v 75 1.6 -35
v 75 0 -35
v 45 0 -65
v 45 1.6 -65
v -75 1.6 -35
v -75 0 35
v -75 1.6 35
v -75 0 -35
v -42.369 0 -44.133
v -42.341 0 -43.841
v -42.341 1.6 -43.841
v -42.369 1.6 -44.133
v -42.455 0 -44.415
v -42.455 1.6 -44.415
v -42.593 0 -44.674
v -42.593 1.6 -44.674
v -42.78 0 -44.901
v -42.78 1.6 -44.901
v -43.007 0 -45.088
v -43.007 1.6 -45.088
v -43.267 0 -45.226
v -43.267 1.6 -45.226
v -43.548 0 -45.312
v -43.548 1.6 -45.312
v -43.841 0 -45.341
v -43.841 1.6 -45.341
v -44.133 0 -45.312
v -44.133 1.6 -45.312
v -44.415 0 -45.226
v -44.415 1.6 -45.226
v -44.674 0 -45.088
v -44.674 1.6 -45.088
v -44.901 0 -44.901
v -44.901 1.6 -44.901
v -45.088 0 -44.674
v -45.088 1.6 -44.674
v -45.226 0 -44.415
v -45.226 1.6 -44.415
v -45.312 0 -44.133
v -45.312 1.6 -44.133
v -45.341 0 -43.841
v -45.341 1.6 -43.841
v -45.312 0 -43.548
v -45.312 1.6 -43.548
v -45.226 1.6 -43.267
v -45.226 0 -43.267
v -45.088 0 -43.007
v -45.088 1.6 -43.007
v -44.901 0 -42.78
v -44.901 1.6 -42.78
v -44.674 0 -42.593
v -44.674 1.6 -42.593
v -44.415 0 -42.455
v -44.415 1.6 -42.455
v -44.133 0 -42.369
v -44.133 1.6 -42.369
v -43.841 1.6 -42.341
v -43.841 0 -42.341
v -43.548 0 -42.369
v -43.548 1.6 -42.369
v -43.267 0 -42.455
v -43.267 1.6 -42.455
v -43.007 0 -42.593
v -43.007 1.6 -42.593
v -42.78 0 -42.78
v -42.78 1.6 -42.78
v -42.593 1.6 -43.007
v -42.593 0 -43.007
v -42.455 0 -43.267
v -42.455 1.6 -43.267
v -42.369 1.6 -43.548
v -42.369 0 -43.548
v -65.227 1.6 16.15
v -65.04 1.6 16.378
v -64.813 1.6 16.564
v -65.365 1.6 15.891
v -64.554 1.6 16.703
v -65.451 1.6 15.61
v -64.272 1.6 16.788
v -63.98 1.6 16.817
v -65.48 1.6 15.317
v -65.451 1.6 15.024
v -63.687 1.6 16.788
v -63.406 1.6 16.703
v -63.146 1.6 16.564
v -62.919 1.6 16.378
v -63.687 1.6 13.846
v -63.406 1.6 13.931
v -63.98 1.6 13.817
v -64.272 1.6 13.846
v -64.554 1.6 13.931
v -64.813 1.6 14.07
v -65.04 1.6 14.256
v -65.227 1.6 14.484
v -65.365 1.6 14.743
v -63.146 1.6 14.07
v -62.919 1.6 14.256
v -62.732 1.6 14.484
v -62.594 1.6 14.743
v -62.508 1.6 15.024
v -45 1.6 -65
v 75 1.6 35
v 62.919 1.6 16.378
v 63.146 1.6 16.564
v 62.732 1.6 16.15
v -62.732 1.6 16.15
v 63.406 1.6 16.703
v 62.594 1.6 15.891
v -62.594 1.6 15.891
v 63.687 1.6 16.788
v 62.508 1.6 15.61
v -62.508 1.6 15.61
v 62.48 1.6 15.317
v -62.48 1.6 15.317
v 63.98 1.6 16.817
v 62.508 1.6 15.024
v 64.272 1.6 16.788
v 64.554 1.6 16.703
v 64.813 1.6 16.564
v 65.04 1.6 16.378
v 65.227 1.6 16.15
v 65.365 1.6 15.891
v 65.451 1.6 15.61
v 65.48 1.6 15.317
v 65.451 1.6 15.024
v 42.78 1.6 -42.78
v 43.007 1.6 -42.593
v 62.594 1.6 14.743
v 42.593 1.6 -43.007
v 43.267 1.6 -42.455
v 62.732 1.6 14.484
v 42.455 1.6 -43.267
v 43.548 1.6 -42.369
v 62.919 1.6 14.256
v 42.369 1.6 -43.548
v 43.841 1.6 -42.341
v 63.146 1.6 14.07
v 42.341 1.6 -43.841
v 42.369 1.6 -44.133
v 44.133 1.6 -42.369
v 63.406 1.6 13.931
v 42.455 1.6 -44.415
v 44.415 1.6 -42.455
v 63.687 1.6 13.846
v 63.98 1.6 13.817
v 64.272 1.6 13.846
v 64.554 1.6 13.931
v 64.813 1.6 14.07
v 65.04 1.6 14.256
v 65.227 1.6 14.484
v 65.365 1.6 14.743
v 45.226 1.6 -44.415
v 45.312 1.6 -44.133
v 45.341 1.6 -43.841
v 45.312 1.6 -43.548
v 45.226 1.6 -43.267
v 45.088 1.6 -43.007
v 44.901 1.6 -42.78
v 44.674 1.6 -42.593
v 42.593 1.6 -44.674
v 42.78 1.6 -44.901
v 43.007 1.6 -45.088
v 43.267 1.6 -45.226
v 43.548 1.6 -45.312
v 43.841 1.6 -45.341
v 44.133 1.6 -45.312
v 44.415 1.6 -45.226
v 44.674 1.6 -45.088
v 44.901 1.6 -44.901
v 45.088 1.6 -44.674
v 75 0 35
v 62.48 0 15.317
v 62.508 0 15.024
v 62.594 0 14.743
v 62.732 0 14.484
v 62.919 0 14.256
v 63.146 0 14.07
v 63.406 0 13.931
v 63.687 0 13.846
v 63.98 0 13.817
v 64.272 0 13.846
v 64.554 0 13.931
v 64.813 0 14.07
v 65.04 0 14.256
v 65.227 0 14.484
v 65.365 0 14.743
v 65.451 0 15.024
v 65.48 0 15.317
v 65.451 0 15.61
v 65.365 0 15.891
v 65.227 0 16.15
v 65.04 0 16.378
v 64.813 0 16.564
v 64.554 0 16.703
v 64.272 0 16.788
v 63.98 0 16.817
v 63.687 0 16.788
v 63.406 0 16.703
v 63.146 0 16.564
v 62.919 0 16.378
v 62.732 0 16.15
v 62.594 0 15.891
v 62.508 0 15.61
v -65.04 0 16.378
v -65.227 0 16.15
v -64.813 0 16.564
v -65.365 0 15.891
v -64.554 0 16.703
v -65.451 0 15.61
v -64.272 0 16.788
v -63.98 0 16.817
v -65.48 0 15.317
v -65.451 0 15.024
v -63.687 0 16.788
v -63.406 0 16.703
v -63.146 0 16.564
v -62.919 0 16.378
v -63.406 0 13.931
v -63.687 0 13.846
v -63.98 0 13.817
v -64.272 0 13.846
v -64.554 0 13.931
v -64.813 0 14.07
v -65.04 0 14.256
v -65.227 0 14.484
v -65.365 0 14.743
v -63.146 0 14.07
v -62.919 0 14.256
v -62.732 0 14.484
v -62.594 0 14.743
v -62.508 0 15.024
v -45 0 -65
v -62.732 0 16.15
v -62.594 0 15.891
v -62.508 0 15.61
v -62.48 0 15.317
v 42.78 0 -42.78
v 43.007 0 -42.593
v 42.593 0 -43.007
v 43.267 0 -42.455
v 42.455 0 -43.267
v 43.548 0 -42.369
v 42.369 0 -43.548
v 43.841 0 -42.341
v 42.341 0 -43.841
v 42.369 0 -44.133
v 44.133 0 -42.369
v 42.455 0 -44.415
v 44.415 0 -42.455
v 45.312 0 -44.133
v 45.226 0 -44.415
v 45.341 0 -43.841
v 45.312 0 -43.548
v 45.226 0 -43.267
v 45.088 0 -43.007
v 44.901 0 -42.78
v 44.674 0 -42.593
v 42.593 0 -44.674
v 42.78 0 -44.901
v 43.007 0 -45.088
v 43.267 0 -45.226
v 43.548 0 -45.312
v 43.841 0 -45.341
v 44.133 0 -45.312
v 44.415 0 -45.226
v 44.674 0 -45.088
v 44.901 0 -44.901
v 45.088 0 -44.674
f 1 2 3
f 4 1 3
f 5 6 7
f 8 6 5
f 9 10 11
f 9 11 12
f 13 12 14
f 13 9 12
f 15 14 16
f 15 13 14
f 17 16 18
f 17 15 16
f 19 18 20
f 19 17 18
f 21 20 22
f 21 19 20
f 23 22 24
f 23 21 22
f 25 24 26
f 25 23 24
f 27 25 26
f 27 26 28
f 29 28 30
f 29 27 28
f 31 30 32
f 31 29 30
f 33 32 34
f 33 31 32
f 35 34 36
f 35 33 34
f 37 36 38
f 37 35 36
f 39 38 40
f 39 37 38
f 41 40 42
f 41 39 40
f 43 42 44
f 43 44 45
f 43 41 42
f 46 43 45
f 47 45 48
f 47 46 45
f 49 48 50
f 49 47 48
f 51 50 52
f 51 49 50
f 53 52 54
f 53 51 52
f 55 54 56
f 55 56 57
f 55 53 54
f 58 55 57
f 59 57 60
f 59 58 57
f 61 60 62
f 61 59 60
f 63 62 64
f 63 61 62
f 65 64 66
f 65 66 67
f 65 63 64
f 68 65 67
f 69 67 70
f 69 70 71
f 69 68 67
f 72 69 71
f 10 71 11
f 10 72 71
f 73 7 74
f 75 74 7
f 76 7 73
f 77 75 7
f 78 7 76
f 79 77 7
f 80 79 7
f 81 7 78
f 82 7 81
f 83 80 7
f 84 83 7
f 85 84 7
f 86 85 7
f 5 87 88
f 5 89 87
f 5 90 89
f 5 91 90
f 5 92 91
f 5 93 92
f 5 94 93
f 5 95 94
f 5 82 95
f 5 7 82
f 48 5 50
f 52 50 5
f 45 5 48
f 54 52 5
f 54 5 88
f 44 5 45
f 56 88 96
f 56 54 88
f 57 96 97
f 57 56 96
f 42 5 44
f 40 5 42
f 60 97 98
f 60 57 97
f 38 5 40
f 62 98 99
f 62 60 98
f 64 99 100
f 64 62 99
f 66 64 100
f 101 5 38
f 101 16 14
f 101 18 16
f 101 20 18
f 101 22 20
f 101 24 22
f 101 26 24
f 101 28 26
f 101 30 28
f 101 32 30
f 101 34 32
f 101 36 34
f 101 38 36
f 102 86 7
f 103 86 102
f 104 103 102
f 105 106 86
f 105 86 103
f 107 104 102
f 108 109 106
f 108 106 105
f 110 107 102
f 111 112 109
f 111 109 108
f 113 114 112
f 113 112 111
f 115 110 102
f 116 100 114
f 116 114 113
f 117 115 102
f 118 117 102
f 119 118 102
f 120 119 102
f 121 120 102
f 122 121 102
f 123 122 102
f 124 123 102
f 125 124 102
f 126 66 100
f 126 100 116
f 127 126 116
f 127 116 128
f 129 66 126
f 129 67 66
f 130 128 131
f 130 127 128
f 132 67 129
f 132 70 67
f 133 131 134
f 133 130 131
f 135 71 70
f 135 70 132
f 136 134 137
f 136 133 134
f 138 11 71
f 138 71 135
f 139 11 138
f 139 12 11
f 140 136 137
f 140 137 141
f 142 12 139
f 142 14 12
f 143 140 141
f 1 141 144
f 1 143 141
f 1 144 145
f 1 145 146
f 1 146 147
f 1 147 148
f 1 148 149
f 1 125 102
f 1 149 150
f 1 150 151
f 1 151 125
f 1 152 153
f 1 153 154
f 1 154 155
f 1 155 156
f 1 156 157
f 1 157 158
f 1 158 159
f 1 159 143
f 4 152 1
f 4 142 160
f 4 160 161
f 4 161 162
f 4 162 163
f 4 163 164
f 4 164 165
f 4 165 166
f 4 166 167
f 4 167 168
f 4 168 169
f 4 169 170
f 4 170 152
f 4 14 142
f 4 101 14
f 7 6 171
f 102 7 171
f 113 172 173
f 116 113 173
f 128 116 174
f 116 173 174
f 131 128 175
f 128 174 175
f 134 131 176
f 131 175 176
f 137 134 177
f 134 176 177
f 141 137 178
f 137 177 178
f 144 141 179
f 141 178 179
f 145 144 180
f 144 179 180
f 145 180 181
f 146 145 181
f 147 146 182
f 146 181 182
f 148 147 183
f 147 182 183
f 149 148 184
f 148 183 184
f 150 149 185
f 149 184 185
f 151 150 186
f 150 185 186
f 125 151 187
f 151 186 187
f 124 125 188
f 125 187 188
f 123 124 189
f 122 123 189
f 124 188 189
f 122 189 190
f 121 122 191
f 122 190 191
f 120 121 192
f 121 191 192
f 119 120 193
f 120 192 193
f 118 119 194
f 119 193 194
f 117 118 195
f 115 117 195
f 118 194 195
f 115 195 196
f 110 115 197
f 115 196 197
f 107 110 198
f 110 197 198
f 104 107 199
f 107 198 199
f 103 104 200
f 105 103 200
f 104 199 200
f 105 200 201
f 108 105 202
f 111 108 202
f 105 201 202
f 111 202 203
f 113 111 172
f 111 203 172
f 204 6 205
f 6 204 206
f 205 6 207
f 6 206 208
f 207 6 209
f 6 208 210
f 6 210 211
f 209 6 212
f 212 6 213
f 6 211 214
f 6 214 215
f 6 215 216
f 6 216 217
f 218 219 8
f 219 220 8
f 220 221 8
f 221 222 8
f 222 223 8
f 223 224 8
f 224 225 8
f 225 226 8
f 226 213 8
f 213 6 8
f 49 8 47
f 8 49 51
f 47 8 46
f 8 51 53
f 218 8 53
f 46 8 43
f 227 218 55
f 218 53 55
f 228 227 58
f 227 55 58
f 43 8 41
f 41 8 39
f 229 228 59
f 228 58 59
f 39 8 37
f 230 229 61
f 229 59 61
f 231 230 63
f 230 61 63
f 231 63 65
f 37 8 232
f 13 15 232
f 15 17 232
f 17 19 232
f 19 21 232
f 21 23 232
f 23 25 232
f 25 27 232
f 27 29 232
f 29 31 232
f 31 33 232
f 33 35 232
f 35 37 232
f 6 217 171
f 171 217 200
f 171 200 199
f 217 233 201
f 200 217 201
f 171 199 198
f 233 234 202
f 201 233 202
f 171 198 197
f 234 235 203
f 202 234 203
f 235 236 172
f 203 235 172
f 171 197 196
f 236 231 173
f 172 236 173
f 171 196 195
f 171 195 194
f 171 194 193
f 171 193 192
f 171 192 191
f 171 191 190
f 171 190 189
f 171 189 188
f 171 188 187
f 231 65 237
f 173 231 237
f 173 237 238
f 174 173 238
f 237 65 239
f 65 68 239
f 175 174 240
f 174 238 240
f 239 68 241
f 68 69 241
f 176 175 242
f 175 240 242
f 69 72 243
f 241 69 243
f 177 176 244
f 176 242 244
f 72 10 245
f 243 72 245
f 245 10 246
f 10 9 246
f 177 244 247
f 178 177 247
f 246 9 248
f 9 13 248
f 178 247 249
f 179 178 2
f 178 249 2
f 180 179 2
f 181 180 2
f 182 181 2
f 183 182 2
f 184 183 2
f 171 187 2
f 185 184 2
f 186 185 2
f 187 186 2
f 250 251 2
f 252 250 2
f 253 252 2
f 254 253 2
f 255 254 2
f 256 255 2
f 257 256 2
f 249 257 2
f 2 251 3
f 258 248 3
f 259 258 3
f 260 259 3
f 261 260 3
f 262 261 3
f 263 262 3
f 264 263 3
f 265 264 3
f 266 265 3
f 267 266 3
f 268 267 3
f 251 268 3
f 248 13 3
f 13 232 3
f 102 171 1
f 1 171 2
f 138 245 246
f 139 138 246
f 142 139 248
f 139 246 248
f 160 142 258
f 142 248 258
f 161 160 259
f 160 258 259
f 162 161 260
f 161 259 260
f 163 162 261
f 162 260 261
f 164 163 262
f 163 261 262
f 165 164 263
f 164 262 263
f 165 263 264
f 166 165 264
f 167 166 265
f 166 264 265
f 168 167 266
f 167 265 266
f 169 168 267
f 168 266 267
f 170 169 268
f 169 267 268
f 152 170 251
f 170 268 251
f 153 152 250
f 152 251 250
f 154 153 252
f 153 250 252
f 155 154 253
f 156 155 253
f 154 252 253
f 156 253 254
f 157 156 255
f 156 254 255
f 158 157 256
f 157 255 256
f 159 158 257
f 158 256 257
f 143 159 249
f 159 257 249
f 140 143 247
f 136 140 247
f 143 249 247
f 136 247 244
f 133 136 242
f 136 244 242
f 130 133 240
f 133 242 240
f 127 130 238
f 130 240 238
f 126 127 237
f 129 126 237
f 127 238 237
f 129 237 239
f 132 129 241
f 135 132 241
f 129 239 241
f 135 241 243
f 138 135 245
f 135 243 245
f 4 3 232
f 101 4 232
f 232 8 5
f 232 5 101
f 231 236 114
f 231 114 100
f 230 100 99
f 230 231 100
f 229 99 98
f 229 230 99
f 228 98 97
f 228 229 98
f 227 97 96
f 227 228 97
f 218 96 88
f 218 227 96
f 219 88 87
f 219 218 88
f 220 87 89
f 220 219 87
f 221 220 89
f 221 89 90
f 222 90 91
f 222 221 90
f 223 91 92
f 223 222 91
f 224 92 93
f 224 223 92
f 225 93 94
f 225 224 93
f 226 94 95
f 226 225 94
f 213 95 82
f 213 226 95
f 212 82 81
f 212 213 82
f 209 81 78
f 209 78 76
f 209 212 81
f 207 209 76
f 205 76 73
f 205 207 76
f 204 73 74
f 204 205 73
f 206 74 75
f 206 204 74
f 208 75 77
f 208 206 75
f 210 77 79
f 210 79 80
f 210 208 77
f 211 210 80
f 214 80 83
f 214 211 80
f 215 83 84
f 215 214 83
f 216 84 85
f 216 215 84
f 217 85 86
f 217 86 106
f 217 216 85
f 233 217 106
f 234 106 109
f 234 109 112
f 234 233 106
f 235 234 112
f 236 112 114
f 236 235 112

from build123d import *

# Parameters (mm, degrees)
SKETCH1_R           = 1.5
BOSS_EXTRUDE1_DEPTH = 1.6


with BuildPart() as part:
    # Sketch1 → Boss-Extrude1 (new body)
    with BuildSketch(Plane(origin=(0, 0, 0), x_dir=(1, 0, 0), z_dir=(0, 1, 0))):
        Polygon((-75, -35), (-75, 35), (-45, 65), (0, 65), (0, -35), align=None)
        with Locations((-43.840620434, 43.840620434)):
            Circle(SKETCH1_R, mode=Mode.SUBTRACT)
        with Locations((-63.979633983, -15.316867676)):
            Circle(SKETCH1_R, mode=Mode.SUBTRACT)
    boss_extrude1 = extrude(amount=BOSS_EXTRUDE1_DEPTH)

    # Mirror1: Boss-Extrude1 across plane
    add(boss_extrude1.mirror(Plane(origin=(0, 1.6, 35), x_dir=(0, 0, 1), z_dir=(-1, 0, 0))))


solid = part.part
